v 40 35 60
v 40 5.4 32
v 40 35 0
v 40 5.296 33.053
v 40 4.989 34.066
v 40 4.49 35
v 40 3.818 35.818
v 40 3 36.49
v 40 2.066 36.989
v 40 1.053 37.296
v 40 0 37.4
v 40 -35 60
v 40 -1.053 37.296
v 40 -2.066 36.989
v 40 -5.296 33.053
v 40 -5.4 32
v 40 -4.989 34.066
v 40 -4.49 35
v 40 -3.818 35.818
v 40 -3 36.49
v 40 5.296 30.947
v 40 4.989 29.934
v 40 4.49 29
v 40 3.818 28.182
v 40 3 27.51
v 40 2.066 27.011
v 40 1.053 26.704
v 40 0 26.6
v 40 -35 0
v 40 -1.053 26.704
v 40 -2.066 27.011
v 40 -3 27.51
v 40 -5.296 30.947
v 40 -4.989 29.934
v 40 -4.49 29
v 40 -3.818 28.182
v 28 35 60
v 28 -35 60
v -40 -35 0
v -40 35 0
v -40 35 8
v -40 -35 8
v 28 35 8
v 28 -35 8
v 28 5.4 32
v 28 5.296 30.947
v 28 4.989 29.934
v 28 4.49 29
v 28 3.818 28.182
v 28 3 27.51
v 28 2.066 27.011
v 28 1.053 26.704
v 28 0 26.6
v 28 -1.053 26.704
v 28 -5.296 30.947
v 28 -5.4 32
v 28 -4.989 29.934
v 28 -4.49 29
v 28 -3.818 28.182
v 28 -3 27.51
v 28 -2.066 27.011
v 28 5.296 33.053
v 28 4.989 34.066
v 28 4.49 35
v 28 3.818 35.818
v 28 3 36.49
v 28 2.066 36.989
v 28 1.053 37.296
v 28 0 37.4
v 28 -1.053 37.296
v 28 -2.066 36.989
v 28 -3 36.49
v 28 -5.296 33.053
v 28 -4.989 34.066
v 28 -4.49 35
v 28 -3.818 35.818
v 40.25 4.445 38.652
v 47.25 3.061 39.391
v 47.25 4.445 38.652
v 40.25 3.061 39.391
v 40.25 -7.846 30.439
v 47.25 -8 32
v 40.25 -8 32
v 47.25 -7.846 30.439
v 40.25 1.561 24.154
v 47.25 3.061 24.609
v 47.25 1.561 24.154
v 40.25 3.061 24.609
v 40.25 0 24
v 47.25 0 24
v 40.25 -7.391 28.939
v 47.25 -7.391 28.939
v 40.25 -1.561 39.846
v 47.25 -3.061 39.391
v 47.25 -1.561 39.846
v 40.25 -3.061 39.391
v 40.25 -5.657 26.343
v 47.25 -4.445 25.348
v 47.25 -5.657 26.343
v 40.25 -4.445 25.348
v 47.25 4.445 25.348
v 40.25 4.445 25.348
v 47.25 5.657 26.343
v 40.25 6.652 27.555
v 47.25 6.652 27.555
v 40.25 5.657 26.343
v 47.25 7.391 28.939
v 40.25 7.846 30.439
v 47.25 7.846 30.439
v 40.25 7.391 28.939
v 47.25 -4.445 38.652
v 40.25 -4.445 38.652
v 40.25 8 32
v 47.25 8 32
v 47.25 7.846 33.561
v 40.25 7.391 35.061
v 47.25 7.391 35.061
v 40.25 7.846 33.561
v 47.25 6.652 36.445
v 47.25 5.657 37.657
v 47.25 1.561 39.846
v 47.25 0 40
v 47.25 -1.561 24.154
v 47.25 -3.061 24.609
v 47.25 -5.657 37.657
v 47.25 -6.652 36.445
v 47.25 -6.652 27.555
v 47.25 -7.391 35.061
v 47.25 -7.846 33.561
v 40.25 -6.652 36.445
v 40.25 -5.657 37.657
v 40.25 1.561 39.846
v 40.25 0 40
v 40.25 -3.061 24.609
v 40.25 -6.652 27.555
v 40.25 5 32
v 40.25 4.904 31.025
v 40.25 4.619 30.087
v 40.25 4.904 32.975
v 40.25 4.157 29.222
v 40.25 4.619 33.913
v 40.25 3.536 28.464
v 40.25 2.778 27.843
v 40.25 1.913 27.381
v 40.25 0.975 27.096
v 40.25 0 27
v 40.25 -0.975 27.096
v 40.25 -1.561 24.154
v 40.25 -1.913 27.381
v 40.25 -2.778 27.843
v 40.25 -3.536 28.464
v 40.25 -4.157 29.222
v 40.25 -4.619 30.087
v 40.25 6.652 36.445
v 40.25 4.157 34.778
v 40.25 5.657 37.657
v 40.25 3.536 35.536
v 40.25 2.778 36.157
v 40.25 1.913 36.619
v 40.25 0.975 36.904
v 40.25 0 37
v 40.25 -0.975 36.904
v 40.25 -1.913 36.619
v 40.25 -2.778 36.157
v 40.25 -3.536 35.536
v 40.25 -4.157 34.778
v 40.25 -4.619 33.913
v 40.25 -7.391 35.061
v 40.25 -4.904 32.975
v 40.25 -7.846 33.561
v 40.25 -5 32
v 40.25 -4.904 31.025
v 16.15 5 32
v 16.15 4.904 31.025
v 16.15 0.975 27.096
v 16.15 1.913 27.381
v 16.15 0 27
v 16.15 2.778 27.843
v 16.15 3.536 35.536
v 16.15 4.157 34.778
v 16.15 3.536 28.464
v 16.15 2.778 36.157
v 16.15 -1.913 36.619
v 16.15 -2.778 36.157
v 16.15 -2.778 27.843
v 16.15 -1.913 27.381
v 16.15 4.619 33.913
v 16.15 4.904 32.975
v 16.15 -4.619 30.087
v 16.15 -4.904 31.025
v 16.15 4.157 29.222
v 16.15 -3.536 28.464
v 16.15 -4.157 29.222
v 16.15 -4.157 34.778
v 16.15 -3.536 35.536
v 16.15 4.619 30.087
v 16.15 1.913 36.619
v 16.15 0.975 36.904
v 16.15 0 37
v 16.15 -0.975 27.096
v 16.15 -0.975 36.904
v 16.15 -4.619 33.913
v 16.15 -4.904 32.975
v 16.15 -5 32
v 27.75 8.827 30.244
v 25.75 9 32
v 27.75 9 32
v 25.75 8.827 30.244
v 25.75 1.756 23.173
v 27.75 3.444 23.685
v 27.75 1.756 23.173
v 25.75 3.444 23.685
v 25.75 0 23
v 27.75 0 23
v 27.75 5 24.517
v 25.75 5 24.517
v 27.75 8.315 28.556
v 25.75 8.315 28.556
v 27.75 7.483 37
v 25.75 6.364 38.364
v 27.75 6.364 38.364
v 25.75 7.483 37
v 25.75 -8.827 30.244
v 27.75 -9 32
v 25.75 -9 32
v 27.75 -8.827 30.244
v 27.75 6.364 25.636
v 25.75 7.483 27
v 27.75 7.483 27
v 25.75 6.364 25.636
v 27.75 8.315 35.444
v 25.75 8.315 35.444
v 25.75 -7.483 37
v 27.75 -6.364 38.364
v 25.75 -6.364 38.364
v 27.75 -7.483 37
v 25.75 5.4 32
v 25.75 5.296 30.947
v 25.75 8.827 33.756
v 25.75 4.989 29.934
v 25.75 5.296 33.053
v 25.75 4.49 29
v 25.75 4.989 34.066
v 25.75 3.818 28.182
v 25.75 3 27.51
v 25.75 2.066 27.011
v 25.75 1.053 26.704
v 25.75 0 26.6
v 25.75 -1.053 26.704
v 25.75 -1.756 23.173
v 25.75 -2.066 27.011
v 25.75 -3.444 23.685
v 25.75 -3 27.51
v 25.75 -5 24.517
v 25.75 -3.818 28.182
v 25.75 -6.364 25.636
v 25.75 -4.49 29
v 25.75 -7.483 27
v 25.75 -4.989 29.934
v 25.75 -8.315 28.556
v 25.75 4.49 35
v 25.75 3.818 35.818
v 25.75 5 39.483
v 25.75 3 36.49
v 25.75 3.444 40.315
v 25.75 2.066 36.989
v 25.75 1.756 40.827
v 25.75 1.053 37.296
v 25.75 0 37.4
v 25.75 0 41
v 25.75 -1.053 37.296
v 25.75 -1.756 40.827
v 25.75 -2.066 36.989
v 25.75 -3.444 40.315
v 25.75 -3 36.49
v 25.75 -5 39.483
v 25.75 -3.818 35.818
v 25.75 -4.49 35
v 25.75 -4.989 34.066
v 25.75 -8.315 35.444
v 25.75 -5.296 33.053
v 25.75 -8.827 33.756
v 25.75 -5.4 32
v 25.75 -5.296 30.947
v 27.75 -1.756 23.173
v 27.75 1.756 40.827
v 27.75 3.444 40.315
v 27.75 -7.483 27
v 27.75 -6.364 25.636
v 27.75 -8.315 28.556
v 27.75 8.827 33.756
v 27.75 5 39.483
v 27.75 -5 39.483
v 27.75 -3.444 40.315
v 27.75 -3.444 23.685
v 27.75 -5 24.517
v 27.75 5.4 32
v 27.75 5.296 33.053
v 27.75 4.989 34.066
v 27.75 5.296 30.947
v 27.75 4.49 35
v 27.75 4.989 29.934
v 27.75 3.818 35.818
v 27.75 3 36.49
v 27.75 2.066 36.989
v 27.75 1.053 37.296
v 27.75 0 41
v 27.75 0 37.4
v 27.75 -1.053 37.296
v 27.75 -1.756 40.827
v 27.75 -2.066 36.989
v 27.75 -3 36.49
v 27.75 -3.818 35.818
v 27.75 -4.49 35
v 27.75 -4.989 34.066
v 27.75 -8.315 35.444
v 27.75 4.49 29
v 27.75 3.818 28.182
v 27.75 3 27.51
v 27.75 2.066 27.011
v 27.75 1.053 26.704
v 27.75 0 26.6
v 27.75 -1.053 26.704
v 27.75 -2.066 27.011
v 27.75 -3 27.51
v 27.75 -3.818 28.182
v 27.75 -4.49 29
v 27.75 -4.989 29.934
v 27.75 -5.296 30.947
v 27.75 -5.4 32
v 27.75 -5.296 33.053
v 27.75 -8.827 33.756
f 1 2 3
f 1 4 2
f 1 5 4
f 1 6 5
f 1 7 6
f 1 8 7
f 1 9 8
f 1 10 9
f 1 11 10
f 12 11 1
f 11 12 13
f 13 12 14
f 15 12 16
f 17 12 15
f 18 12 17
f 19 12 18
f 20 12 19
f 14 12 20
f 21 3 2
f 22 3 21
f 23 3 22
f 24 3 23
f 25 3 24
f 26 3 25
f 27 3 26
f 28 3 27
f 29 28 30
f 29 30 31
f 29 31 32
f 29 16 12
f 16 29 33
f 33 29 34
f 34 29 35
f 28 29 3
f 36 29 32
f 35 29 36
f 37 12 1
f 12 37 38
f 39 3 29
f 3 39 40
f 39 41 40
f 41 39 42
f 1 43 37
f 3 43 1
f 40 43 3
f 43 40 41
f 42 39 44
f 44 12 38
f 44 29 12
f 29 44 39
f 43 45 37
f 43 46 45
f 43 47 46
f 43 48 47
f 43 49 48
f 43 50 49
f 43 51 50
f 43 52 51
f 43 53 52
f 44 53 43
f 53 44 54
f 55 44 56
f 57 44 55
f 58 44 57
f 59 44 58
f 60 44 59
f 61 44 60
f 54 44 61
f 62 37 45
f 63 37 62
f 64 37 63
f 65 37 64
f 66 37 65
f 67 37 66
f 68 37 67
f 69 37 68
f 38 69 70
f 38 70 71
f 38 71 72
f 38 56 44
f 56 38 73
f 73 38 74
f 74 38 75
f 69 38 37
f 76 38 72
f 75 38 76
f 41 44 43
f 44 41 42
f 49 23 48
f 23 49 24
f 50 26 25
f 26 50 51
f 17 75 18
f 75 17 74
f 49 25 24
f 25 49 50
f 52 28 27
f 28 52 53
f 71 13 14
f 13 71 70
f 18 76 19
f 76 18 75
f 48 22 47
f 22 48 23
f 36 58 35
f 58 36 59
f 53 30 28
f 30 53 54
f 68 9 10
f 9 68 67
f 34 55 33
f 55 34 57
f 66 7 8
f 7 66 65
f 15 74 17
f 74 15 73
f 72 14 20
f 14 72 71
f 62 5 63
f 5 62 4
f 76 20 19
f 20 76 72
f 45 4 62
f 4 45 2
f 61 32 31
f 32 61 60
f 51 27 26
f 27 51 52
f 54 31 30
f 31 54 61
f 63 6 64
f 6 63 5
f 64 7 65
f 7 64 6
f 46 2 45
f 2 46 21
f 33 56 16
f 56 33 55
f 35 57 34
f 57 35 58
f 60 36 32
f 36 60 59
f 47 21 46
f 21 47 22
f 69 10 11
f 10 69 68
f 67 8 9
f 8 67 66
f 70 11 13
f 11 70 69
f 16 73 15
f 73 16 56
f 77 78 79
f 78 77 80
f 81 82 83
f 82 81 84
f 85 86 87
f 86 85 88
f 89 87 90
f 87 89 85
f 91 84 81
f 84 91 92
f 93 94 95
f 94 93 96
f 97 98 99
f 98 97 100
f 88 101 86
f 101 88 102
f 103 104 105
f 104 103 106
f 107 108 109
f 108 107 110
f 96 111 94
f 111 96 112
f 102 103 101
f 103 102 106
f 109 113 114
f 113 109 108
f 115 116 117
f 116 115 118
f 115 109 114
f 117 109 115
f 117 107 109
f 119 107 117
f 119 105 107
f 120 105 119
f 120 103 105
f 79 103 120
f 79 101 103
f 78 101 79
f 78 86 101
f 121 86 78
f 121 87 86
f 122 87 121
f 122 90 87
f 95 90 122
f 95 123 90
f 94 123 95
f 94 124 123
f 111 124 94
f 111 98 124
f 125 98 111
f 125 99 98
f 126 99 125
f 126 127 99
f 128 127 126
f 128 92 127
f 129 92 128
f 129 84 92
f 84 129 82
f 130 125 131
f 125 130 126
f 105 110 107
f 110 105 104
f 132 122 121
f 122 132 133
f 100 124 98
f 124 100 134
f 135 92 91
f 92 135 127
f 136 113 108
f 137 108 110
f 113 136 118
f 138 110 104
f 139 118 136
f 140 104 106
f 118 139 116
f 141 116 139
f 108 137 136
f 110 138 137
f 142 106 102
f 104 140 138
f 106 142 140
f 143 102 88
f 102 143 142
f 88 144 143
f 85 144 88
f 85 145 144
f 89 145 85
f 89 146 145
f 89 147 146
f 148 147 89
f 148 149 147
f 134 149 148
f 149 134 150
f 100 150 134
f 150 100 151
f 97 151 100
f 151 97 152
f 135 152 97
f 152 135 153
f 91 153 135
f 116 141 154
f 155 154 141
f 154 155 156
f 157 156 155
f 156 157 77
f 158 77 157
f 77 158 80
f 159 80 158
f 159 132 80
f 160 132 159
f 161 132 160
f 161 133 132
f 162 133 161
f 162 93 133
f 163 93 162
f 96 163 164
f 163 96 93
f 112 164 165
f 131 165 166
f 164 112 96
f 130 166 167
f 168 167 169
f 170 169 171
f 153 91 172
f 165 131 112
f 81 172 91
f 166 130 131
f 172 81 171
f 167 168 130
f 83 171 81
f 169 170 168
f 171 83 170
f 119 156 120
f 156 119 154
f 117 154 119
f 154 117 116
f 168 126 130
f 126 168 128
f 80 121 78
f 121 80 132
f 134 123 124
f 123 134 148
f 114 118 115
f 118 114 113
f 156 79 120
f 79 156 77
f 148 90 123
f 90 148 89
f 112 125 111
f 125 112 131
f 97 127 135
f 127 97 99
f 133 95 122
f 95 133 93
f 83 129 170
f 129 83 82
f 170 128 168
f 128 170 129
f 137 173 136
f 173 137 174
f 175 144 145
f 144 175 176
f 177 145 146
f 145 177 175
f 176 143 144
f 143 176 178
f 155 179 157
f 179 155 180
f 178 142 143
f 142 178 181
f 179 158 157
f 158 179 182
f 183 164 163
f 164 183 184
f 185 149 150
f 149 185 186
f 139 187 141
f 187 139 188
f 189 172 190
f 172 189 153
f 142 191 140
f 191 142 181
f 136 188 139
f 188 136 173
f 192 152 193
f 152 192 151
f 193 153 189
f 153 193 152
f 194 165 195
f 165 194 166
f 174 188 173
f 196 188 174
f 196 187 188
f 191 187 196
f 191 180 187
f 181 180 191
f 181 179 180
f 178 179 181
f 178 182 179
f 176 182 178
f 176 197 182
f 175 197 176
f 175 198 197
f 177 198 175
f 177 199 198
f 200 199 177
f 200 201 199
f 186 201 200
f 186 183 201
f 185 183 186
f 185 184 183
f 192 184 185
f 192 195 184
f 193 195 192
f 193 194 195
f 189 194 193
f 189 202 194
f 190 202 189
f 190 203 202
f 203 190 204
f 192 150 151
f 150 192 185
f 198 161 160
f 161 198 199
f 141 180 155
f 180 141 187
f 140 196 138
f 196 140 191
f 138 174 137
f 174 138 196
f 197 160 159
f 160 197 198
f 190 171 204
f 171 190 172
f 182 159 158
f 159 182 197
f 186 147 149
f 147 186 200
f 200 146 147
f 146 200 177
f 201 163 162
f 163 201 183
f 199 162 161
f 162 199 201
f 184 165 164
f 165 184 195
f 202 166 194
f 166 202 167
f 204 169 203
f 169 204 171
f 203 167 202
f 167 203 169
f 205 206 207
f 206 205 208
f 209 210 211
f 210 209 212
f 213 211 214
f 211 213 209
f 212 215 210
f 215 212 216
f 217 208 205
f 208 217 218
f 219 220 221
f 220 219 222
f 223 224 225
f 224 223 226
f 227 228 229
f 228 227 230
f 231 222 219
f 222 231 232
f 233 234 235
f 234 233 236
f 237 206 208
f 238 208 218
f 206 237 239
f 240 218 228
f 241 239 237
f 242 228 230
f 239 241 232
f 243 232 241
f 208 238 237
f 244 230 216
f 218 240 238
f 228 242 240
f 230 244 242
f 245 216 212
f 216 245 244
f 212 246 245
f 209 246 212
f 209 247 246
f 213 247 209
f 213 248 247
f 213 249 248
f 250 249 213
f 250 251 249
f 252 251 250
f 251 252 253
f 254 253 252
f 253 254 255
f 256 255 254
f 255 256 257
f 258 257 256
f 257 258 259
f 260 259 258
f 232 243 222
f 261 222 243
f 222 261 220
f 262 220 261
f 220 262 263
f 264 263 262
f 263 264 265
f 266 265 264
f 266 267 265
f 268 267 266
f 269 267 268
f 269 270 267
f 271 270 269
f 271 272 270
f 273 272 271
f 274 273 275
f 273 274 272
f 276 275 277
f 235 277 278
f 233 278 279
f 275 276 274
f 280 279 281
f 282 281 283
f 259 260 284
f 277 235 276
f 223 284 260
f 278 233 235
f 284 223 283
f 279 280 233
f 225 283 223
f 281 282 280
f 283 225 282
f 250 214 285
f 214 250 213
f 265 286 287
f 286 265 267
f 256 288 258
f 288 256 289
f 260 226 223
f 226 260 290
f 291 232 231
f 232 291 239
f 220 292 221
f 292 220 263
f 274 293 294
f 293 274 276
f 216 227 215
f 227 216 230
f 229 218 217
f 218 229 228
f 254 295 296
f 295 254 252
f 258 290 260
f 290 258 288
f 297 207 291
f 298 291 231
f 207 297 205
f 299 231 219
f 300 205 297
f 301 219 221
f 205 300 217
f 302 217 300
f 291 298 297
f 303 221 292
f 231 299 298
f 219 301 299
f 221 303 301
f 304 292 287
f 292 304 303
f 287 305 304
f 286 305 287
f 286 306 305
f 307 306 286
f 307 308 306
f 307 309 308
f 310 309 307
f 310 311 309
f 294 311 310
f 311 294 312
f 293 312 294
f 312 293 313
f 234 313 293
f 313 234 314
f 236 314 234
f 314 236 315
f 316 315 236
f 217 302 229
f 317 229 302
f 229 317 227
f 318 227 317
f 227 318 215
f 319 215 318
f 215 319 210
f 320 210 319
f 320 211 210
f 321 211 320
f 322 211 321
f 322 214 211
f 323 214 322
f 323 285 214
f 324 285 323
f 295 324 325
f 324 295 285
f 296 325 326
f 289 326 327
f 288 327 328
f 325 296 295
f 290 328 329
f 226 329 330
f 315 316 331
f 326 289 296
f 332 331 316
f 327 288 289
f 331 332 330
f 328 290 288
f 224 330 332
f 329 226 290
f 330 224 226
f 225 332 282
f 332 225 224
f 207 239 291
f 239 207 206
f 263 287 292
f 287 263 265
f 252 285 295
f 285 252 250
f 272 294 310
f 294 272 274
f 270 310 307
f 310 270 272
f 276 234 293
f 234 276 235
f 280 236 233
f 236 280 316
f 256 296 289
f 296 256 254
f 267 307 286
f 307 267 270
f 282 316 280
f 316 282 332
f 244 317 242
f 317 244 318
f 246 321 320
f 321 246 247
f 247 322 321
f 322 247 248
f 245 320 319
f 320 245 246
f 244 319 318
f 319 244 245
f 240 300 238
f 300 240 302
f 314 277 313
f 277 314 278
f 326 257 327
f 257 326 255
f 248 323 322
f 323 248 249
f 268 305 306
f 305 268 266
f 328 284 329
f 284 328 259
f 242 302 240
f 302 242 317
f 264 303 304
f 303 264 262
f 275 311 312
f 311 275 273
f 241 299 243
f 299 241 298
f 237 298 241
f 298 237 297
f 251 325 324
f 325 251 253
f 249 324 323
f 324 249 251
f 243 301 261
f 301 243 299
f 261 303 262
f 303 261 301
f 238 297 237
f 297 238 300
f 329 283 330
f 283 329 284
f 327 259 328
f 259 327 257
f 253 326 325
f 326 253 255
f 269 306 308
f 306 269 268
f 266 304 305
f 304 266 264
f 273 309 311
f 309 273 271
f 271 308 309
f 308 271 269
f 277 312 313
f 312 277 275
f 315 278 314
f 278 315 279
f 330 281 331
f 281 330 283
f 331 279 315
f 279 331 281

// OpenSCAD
$fn = 32;

// ------------------------------------------------------------------------
// Bolted bracket: 80 x 70 mm bracket with 1 bolt joints
// Every part is its own module, assembly() places them once.
// ------------------------------------------------------------------------

// --- part 1 ---
module bracket() {
  difference() {
    translate([-40, -35, 0]) cube([80, 70, 60]);
    translate([-41, -36, 8]) cube([69, 72, 53]);
    translate([34, 0, 32]) rotate([0, 90, 0]) cylinder(h = 14, d = 10.8, center = true);
  }
}

// --- part 2 ---
module bolt() {
  cylinder(h = 7, d = 16);
  translate([0, 0, -24.1]) cylinder(h = 24.1, d = 10);
}

// --- part 3 ---
module washer() {
  difference() {
      translate([0, 0, 0]) cylinder(h = 2, d = 18);
      translate([0, 0, -1]) cylinder(h = 4, d = 10.8);
    }
}

// --- assembly ---
module assembly() {
  translate([0, 0, 0]) rotate([0, 0, 0]) bracket();
  translate([40.25, 0, 32]) rotate([0, 90, 0]) bolt();
  translate([25.75, 0, 32]) rotate([0, 90, 0]) washer();
}

assembly();
